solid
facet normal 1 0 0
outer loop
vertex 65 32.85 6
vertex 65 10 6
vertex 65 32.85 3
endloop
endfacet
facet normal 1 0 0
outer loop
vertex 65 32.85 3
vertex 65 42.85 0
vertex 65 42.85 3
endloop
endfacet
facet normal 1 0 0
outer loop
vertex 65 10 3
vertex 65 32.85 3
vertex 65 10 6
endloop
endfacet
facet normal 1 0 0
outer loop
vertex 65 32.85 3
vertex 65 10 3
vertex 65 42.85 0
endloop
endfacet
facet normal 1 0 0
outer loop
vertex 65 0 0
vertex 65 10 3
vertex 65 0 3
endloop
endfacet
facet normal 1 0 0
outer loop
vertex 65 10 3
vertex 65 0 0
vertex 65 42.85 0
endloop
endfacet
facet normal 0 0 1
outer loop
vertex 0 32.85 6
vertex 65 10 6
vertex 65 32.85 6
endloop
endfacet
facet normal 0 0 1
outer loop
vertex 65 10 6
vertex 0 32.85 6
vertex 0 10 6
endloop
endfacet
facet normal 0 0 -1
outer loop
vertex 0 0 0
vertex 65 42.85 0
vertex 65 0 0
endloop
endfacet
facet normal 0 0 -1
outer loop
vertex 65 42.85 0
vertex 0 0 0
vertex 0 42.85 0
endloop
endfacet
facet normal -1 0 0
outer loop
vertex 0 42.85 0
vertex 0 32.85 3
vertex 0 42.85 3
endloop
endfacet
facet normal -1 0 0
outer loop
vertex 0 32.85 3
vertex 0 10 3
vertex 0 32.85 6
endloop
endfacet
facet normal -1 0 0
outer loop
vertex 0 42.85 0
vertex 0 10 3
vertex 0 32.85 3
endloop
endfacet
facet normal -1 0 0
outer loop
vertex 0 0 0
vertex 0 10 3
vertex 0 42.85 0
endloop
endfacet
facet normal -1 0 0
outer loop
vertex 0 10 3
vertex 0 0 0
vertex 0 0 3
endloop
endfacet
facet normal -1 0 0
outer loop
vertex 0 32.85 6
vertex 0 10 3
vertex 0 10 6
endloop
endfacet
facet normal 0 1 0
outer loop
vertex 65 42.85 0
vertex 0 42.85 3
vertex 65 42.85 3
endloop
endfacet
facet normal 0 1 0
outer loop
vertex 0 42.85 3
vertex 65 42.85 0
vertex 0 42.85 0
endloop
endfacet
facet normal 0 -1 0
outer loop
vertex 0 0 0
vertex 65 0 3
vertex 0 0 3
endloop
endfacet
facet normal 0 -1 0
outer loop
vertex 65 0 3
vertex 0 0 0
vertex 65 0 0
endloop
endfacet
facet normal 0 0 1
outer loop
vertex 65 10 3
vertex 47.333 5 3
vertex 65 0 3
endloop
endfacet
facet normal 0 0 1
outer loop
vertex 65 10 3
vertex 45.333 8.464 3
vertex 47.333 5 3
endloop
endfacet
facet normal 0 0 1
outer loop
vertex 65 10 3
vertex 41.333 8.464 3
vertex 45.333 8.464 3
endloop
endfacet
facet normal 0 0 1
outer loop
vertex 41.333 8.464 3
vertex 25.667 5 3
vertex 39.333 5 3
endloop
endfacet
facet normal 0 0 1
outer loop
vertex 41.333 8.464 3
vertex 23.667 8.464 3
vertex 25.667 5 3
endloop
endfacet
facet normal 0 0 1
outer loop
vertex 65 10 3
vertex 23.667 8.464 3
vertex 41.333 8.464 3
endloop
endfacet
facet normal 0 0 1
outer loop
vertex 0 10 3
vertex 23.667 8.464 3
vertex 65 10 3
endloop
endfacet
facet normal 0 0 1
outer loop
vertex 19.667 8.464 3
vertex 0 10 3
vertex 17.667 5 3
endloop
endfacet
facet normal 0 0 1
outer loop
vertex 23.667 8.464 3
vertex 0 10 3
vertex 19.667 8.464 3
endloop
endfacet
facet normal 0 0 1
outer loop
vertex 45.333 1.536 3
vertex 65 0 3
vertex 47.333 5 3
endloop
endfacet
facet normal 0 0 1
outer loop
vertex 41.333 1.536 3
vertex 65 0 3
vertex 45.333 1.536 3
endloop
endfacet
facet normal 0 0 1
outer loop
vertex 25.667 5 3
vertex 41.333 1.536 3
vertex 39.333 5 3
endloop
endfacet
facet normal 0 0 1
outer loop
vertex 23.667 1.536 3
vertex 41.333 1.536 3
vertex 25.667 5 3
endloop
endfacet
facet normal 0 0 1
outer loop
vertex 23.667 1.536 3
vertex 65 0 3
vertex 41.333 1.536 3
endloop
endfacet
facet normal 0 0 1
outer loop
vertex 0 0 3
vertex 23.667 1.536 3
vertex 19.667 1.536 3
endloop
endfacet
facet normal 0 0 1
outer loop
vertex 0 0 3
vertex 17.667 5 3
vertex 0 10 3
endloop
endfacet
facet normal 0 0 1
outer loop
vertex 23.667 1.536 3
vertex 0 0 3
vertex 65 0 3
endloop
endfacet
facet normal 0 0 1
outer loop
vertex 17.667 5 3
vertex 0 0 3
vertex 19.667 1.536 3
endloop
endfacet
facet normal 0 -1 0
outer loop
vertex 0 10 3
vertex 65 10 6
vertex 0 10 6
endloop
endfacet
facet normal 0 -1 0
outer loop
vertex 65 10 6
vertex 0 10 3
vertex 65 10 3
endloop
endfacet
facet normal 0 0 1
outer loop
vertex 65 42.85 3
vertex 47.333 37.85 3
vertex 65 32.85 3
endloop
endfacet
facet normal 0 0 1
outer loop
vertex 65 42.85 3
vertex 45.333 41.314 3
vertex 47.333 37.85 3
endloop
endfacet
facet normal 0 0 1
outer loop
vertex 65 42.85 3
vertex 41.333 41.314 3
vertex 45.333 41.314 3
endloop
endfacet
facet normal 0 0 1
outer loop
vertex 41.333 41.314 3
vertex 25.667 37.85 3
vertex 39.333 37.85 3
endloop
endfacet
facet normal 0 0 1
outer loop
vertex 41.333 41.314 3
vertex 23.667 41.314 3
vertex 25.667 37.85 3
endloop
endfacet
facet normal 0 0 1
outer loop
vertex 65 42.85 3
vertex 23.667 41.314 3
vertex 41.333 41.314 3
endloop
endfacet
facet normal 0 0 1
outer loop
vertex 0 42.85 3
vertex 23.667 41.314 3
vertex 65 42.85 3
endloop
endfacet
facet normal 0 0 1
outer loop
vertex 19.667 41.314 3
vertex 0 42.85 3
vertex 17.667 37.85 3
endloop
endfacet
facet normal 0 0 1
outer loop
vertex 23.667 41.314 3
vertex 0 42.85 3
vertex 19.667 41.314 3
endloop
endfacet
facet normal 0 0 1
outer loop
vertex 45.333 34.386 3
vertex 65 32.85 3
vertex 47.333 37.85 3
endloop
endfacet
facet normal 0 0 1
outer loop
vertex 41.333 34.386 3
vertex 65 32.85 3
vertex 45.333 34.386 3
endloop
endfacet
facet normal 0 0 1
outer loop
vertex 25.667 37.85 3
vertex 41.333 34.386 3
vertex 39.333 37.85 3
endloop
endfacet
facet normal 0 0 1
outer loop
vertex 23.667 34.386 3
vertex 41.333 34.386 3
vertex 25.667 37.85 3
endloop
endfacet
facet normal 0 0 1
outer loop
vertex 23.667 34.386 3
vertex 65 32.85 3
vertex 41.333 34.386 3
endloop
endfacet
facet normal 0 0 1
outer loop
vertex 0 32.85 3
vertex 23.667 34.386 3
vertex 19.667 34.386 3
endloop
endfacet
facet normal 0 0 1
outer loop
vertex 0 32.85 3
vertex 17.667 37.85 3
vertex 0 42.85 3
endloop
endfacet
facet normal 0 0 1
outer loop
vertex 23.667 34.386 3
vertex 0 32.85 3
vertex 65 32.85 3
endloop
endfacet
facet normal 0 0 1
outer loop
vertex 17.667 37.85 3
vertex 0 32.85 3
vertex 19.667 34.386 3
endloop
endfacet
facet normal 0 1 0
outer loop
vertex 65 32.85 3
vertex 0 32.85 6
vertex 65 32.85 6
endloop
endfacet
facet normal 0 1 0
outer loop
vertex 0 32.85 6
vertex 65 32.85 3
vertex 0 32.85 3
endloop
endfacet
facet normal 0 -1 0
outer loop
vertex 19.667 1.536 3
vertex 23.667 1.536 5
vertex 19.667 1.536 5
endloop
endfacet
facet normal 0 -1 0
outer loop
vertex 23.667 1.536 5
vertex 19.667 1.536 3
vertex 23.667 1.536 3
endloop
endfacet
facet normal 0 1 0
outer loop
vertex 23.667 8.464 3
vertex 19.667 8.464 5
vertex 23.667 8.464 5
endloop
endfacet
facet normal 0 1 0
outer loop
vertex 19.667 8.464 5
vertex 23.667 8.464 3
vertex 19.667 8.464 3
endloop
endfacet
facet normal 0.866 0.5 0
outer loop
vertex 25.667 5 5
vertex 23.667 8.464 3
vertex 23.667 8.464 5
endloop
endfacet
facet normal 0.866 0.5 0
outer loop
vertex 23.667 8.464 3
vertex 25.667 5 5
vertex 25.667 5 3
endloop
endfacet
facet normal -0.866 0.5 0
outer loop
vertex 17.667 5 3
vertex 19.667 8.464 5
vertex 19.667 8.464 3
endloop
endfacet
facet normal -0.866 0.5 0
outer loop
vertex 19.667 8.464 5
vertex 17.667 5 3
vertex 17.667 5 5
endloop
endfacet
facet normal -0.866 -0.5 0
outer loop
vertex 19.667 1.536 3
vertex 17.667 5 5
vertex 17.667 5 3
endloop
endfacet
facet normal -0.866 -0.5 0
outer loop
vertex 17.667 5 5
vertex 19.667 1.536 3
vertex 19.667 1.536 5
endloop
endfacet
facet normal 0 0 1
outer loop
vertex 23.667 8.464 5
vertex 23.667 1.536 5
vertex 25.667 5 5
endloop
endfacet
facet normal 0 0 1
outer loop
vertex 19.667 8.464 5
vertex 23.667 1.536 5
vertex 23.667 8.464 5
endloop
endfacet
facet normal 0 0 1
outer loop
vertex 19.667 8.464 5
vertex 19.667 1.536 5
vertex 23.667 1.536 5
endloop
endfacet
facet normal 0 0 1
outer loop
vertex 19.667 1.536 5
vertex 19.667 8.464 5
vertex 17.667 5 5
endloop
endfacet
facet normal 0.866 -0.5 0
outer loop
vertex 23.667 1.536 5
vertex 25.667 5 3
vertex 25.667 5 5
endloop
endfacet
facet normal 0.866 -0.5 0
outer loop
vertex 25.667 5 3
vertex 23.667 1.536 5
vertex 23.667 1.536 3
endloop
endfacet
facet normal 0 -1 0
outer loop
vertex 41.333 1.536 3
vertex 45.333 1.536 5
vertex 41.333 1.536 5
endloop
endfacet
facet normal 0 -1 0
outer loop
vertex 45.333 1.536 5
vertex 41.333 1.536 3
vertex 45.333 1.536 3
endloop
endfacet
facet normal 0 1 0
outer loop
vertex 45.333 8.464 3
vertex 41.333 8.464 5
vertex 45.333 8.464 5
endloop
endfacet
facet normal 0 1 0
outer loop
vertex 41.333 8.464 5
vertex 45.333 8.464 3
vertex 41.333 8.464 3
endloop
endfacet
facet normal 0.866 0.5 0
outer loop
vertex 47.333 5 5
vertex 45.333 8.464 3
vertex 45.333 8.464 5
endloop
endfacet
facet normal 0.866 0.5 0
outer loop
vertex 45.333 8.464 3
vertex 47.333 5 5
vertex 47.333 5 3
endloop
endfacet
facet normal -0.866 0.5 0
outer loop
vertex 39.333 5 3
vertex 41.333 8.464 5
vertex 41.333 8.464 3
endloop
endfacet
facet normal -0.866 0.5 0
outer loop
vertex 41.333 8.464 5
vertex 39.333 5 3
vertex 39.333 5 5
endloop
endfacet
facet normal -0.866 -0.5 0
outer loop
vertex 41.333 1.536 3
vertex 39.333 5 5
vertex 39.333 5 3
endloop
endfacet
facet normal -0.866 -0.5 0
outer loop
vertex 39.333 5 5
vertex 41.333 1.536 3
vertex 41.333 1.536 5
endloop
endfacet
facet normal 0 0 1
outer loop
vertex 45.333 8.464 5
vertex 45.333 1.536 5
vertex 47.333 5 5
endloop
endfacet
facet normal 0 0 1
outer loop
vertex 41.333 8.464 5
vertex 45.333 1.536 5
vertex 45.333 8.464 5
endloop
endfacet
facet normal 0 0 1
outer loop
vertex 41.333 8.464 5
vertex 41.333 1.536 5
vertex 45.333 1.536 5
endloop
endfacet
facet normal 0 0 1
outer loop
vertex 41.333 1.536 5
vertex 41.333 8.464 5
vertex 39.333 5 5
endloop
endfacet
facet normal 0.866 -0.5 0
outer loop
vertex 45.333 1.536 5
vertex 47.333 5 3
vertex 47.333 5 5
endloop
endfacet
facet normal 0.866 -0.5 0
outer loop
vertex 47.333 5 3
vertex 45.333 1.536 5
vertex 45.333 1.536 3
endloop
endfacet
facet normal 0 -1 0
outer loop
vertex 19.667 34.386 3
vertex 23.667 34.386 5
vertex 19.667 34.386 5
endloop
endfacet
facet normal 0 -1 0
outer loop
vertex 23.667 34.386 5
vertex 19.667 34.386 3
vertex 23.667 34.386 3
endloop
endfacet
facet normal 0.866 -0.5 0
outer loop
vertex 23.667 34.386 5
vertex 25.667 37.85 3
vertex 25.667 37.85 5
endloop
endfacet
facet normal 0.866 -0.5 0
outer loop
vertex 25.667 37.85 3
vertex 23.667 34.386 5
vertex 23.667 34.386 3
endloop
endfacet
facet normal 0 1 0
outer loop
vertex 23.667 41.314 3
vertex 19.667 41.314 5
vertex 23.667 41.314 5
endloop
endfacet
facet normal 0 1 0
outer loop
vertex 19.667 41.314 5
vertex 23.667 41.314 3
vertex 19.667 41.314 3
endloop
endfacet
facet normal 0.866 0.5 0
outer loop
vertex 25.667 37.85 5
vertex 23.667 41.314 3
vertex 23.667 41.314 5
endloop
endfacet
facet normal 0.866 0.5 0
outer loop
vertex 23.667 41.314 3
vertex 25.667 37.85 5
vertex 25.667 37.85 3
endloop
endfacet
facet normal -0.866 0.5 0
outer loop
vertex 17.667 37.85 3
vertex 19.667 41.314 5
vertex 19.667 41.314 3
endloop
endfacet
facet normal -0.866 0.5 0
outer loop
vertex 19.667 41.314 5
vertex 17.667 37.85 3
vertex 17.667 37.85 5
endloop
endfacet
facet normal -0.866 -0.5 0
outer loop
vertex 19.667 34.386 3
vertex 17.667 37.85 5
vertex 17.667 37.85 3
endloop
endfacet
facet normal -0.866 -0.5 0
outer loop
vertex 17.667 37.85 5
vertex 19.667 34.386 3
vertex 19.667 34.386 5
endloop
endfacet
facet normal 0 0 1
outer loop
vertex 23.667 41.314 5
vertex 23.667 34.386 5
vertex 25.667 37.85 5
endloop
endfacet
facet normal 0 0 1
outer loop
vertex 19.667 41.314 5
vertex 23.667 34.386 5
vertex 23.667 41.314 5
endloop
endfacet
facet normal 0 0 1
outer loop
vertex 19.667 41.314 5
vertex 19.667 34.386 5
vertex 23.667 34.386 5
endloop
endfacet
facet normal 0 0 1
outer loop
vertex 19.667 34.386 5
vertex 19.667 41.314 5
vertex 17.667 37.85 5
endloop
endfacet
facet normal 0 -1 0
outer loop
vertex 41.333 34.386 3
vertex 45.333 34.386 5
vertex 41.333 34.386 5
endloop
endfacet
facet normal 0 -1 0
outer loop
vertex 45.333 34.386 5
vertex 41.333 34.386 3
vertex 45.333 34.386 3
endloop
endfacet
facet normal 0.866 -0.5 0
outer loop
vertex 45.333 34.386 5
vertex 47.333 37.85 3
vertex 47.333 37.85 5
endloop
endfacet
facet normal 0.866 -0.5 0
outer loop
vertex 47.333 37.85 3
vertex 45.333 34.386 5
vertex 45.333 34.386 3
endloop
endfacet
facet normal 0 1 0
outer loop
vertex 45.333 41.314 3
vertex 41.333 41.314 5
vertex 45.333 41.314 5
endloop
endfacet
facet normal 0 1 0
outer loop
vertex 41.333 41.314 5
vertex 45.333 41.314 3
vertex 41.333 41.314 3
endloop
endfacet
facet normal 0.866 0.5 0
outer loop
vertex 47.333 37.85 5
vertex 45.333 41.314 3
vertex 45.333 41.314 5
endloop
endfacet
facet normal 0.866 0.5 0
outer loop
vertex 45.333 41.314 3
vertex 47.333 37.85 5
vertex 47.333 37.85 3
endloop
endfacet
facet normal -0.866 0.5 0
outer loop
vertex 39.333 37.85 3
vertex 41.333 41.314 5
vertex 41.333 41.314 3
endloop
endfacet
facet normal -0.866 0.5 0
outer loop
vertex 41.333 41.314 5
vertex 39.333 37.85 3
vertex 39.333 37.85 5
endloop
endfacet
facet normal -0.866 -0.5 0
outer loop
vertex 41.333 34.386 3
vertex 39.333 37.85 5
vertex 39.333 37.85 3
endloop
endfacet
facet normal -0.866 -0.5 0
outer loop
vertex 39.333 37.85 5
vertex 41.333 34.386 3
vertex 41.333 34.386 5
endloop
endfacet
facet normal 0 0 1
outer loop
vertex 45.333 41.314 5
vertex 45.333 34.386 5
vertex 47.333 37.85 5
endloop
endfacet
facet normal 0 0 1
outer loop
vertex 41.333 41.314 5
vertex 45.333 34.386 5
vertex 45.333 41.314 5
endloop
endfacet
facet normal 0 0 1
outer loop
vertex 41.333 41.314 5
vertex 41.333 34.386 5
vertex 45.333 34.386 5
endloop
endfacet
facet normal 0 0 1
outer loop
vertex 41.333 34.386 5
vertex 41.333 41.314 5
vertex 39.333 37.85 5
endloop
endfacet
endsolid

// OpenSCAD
lipHeight = 3;
lipLength = 10;
height = 6;
length = 42.85;
width = 65;
protrusionHeight = 2;
protrusionRadius = 4;
protrusionWidthOffset = width / 3;
protrusionLengthOffset = lipLength / 2;

$fn=6;
union() {
    difference() {
        cube([width, length, height]);
        translate([0, 0, height - lipHeight])
            cube([width, lipLength, lipHeight]);
        translate([0, length - lipLength, height - lipHeight])
            cube([width, lipLength, lipHeight]);
    };

    translate([protrusionWidthOffset, protrusionLengthOffset, height - lipHeight])
        cylinder(r=protrusionRadius, h=protrusionHeight);
    translate([(width - protrusionWidthOffset), protrusionLengthOffset, height - lipHeight])
        cylinder(r=protrusionRadius, h=protrusionHeight);
    translate([protrusionWidthOffset, length - protrusionLengthOffset, height - lipHeight])
        cylinder(r=protrusionRadius, h=protrusionHeight);
    translate([(width - protrusionWidthOffset), length - protrusionLengthOffset, height - lipHeight])
        cylinder(r=protrusionRadius, h=protrusionHeight);
};
